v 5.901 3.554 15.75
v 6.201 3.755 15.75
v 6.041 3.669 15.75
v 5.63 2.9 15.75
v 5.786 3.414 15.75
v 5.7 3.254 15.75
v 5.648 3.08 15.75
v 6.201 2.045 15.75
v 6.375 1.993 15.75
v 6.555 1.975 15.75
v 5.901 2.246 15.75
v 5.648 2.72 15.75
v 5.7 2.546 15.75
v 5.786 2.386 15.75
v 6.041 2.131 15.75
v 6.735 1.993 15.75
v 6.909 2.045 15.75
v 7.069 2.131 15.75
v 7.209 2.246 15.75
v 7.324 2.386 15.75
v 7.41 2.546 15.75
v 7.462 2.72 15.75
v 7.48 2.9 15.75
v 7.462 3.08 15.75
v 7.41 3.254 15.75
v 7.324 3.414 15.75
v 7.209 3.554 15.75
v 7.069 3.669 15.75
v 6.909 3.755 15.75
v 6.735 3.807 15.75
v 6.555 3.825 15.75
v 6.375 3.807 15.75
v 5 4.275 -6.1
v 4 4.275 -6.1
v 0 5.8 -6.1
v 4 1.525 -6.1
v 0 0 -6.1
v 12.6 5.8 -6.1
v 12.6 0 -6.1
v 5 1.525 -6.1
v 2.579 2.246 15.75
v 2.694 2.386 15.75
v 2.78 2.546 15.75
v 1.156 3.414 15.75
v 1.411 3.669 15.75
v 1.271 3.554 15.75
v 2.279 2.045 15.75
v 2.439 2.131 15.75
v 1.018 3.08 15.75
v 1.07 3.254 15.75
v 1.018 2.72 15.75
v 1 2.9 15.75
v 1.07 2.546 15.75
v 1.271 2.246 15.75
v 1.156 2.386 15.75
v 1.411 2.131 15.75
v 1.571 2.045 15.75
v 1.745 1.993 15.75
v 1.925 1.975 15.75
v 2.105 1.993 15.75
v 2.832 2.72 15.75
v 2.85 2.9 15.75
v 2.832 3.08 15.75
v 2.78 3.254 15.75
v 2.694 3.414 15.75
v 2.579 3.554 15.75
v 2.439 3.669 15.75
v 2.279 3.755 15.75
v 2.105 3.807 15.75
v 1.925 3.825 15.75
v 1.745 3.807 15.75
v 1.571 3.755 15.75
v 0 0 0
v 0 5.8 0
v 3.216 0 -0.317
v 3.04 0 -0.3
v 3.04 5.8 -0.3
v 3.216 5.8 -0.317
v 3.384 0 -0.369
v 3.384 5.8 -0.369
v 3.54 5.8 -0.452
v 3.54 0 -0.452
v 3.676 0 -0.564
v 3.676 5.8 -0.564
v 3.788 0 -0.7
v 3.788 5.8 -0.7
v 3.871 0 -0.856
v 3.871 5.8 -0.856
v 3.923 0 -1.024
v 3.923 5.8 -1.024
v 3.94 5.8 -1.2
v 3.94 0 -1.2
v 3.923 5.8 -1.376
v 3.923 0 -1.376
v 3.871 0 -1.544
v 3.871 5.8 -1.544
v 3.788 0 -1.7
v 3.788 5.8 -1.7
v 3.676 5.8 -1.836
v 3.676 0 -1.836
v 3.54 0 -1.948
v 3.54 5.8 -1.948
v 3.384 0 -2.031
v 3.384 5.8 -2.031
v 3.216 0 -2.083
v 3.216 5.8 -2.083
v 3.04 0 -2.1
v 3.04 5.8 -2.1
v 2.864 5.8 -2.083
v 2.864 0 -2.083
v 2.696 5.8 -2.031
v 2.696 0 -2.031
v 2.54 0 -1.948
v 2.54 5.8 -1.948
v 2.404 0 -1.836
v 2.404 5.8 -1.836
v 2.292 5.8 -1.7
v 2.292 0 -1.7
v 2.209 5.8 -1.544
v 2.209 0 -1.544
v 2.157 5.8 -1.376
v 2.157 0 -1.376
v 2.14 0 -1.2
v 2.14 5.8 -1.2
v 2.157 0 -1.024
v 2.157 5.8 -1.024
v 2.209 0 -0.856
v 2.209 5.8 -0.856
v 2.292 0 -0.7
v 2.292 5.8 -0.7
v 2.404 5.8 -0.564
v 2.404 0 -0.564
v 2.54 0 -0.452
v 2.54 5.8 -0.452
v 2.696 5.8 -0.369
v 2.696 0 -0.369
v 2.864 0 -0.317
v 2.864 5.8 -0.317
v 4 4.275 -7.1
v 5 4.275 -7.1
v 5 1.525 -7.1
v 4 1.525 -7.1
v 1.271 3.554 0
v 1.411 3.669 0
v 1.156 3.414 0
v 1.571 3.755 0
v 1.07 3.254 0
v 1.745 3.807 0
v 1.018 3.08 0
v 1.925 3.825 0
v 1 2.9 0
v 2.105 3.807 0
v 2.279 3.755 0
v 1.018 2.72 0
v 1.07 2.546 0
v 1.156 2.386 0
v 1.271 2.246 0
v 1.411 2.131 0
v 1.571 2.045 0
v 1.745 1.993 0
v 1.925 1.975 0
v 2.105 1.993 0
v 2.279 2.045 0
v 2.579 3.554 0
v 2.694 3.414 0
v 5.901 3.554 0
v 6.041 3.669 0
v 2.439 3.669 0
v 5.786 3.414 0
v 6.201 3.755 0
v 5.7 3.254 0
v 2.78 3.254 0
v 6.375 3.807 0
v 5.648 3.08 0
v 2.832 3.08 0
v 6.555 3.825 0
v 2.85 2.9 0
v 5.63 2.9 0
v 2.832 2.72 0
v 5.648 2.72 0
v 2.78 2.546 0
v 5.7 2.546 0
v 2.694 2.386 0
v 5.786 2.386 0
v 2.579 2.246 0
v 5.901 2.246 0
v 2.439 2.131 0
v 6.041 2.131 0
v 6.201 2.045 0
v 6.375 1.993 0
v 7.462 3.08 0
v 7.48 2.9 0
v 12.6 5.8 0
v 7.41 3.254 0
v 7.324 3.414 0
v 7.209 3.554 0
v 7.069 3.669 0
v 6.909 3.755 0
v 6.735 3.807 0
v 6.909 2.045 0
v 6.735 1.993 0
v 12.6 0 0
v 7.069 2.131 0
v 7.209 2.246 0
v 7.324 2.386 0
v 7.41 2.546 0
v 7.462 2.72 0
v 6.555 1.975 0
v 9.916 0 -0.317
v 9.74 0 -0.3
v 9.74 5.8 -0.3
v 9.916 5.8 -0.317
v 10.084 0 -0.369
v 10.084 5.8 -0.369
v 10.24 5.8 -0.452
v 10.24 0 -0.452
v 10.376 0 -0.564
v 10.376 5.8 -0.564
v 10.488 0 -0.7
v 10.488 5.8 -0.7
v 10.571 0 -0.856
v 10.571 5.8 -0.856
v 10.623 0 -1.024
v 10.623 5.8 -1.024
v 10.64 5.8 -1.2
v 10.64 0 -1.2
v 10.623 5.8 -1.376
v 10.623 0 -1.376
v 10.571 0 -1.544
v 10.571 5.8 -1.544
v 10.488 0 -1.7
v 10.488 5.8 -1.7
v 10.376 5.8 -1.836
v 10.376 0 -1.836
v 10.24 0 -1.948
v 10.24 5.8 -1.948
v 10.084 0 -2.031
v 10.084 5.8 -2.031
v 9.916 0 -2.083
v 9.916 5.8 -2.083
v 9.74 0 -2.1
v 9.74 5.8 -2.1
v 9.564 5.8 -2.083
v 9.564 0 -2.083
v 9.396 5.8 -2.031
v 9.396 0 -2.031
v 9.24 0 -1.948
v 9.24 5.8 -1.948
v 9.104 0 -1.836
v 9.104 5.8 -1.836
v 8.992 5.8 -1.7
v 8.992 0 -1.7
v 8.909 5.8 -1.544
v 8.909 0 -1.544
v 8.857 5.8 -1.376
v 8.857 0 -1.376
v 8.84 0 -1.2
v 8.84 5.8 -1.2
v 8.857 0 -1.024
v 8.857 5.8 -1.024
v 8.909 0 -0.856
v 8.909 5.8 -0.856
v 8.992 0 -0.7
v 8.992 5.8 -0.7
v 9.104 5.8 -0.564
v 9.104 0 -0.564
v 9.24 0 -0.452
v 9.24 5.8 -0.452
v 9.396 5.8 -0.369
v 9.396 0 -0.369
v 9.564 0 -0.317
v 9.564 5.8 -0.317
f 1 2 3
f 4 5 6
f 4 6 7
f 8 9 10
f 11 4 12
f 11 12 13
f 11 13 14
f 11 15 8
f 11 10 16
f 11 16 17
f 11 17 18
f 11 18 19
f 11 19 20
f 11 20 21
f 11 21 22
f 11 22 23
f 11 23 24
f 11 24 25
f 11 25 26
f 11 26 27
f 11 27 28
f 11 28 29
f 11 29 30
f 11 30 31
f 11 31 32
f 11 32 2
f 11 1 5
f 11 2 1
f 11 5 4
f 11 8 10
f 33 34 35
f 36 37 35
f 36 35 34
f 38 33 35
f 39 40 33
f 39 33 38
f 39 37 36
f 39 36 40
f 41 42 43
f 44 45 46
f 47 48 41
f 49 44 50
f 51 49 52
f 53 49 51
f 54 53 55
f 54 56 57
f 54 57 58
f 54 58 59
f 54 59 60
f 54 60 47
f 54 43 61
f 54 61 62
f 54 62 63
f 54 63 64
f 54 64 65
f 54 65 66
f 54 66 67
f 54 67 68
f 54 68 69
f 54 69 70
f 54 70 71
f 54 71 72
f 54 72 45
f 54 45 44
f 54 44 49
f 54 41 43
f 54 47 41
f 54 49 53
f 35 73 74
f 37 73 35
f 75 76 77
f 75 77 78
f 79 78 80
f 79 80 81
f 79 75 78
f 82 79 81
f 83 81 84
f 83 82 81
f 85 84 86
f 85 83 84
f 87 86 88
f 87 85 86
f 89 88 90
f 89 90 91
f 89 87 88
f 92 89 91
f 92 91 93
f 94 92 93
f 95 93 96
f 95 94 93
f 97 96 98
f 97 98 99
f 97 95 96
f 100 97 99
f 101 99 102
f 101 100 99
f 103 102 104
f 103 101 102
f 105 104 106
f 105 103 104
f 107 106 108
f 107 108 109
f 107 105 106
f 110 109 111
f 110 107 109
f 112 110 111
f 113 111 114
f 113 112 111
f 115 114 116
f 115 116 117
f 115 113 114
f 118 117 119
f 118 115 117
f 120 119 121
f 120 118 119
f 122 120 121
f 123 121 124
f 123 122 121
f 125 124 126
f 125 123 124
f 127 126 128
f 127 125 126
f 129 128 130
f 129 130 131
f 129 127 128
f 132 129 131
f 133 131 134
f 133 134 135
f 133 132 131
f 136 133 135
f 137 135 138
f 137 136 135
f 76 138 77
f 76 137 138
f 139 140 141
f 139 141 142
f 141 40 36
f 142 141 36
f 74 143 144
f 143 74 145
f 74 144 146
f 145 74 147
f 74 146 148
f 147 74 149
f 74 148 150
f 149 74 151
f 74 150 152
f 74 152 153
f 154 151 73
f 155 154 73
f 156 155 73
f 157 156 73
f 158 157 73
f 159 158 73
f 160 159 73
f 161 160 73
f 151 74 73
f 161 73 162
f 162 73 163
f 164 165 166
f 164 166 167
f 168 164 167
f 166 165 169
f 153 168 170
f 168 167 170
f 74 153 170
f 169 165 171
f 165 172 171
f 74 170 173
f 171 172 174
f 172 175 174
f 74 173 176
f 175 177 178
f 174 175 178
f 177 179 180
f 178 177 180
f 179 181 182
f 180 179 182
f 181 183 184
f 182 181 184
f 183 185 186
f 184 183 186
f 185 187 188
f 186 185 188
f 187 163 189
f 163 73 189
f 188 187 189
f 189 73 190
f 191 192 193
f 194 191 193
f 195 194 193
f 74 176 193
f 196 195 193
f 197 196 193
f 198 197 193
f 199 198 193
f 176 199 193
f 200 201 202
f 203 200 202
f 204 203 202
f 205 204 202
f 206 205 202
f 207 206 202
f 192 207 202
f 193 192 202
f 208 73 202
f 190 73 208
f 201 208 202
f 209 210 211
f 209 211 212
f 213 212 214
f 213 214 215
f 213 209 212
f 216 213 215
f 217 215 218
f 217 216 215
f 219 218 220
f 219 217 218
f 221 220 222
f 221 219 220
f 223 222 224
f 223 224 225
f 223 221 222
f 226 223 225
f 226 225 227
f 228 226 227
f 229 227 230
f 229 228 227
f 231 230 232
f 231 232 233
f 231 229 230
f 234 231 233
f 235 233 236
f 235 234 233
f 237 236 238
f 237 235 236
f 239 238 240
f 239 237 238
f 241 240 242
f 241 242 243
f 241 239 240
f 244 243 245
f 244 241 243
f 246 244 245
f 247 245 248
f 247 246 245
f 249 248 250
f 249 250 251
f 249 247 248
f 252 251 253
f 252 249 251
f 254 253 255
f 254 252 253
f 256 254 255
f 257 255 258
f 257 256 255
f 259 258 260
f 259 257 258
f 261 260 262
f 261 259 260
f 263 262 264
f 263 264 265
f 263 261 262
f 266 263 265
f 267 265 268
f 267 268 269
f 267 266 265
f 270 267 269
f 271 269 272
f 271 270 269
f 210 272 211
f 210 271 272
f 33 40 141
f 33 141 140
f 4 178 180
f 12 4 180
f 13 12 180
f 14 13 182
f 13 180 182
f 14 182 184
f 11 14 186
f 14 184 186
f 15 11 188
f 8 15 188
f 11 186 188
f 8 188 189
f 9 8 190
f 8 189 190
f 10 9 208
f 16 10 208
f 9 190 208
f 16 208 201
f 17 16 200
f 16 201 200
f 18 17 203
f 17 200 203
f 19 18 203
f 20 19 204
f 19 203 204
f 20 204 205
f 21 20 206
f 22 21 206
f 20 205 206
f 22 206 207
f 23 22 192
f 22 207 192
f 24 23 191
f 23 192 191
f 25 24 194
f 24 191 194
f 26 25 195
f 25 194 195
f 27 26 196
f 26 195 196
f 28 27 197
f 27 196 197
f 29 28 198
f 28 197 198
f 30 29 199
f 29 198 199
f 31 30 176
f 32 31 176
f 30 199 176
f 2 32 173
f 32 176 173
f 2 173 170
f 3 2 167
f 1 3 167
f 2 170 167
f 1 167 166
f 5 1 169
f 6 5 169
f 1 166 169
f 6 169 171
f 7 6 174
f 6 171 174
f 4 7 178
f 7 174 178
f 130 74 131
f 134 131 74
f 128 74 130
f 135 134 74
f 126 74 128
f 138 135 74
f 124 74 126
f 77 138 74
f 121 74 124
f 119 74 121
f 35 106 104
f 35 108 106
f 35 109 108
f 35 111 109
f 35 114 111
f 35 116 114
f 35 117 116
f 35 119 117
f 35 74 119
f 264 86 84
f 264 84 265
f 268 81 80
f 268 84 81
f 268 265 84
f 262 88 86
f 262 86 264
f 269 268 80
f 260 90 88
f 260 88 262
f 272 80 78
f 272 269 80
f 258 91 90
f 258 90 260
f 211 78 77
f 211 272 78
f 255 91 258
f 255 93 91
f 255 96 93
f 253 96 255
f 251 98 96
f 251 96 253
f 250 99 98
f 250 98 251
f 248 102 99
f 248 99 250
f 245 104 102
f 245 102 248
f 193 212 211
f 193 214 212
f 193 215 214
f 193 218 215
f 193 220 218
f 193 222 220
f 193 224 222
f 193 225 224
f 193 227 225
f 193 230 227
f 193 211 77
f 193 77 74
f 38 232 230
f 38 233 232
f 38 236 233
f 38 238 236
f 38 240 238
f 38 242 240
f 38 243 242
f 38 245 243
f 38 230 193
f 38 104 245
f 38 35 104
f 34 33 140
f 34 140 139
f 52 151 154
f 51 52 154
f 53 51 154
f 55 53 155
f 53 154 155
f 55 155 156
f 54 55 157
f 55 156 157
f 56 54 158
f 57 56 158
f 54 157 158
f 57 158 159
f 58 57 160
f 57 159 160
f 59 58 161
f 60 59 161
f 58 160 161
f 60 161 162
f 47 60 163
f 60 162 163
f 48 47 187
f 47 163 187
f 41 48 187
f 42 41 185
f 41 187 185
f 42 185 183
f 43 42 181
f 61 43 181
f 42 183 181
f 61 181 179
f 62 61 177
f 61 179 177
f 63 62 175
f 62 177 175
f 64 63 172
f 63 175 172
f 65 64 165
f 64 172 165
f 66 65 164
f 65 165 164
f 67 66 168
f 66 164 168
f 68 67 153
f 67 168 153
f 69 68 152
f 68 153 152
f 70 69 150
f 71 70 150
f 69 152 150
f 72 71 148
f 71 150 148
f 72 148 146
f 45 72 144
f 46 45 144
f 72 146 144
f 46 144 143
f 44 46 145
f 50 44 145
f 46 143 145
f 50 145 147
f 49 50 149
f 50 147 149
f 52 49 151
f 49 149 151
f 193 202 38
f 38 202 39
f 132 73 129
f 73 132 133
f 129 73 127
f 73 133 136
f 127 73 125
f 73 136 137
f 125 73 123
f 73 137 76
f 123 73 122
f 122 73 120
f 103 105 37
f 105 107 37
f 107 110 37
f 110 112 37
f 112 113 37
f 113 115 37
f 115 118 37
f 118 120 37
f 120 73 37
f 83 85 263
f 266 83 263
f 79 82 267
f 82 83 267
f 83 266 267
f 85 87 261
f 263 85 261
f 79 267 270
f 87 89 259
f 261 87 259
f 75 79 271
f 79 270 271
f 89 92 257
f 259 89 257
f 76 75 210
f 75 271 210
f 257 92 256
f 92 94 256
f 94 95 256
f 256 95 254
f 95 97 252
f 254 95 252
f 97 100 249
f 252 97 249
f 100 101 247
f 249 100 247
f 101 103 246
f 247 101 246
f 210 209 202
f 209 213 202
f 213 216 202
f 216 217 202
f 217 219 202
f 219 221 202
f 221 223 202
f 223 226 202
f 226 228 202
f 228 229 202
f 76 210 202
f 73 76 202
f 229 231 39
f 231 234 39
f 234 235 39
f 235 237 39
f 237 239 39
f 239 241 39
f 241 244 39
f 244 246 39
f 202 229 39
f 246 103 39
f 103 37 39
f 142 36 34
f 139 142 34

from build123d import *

# Parameters (mm, degrees)
SKETCH1_W           = 12.6
SKETCH1_H           = 6.1
SKETCH1_R           = 0.9
BOSS_EXTRUDE1_DEPTH = 5.8
SKETCH2_W           = 1
SKETCH2_H           = 2.75
BOSS_EXTRUDE2_DEPTH = 1
SKETCH3_R           = 0.925
BOSS_EXTRUDE3_DEPTH = 15.75


with BuildPart() as part:
    # Sketch1 → Boss-Extrude1 (new body)
    with BuildSketch(Plane(origin=(0, 0, 0), x_dir=(1, 0, 0), z_dir=(0, 1, 0))):
        with Locations((6.3, 3.05)):
            Rectangle(SKETCH1_W, SKETCH1_H)
        with Locations(Location((3.04, 1.2, 0), (0, 0, 270))):
            Circle(SKETCH1_R, mode=Mode.SUBTRACT)
        with Locations(Location((9.74, 1.2, 0), (0, 0, 270))):
            Circle(SKETCH1_R, mode=Mode.SUBTRACT)
    extrude(amount=BOSS_EXTRUDE1_DEPTH)

    # Sketch2 → Boss-Extrude2 (add)
    with BuildSketch(Plane(origin=(0, 0, -6.1), x_dir=(-1, 0, 0), z_dir=(0, 0, -1))):
        with Locations((-4.5, 2.9)):
            Rectangle(SKETCH2_W, SKETCH2_H)
    extrude(amount=BOSS_EXTRUDE2_DEPTH)

    # Sketch3 → Boss-Extrude3 (add)
    with BuildSketch(Plane.XY):
        with Locations(Location((1.925, 2.9, 0), (0, 0, 180))):
            Circle(SKETCH3_R)
        with Locations(Location((6.555, 2.9, 0), (0, 0, 180))):
            Circle(SKETCH3_R)
    extrude(amount=BOSS_EXTRUDE3_DEPTH)


solid = part.part
